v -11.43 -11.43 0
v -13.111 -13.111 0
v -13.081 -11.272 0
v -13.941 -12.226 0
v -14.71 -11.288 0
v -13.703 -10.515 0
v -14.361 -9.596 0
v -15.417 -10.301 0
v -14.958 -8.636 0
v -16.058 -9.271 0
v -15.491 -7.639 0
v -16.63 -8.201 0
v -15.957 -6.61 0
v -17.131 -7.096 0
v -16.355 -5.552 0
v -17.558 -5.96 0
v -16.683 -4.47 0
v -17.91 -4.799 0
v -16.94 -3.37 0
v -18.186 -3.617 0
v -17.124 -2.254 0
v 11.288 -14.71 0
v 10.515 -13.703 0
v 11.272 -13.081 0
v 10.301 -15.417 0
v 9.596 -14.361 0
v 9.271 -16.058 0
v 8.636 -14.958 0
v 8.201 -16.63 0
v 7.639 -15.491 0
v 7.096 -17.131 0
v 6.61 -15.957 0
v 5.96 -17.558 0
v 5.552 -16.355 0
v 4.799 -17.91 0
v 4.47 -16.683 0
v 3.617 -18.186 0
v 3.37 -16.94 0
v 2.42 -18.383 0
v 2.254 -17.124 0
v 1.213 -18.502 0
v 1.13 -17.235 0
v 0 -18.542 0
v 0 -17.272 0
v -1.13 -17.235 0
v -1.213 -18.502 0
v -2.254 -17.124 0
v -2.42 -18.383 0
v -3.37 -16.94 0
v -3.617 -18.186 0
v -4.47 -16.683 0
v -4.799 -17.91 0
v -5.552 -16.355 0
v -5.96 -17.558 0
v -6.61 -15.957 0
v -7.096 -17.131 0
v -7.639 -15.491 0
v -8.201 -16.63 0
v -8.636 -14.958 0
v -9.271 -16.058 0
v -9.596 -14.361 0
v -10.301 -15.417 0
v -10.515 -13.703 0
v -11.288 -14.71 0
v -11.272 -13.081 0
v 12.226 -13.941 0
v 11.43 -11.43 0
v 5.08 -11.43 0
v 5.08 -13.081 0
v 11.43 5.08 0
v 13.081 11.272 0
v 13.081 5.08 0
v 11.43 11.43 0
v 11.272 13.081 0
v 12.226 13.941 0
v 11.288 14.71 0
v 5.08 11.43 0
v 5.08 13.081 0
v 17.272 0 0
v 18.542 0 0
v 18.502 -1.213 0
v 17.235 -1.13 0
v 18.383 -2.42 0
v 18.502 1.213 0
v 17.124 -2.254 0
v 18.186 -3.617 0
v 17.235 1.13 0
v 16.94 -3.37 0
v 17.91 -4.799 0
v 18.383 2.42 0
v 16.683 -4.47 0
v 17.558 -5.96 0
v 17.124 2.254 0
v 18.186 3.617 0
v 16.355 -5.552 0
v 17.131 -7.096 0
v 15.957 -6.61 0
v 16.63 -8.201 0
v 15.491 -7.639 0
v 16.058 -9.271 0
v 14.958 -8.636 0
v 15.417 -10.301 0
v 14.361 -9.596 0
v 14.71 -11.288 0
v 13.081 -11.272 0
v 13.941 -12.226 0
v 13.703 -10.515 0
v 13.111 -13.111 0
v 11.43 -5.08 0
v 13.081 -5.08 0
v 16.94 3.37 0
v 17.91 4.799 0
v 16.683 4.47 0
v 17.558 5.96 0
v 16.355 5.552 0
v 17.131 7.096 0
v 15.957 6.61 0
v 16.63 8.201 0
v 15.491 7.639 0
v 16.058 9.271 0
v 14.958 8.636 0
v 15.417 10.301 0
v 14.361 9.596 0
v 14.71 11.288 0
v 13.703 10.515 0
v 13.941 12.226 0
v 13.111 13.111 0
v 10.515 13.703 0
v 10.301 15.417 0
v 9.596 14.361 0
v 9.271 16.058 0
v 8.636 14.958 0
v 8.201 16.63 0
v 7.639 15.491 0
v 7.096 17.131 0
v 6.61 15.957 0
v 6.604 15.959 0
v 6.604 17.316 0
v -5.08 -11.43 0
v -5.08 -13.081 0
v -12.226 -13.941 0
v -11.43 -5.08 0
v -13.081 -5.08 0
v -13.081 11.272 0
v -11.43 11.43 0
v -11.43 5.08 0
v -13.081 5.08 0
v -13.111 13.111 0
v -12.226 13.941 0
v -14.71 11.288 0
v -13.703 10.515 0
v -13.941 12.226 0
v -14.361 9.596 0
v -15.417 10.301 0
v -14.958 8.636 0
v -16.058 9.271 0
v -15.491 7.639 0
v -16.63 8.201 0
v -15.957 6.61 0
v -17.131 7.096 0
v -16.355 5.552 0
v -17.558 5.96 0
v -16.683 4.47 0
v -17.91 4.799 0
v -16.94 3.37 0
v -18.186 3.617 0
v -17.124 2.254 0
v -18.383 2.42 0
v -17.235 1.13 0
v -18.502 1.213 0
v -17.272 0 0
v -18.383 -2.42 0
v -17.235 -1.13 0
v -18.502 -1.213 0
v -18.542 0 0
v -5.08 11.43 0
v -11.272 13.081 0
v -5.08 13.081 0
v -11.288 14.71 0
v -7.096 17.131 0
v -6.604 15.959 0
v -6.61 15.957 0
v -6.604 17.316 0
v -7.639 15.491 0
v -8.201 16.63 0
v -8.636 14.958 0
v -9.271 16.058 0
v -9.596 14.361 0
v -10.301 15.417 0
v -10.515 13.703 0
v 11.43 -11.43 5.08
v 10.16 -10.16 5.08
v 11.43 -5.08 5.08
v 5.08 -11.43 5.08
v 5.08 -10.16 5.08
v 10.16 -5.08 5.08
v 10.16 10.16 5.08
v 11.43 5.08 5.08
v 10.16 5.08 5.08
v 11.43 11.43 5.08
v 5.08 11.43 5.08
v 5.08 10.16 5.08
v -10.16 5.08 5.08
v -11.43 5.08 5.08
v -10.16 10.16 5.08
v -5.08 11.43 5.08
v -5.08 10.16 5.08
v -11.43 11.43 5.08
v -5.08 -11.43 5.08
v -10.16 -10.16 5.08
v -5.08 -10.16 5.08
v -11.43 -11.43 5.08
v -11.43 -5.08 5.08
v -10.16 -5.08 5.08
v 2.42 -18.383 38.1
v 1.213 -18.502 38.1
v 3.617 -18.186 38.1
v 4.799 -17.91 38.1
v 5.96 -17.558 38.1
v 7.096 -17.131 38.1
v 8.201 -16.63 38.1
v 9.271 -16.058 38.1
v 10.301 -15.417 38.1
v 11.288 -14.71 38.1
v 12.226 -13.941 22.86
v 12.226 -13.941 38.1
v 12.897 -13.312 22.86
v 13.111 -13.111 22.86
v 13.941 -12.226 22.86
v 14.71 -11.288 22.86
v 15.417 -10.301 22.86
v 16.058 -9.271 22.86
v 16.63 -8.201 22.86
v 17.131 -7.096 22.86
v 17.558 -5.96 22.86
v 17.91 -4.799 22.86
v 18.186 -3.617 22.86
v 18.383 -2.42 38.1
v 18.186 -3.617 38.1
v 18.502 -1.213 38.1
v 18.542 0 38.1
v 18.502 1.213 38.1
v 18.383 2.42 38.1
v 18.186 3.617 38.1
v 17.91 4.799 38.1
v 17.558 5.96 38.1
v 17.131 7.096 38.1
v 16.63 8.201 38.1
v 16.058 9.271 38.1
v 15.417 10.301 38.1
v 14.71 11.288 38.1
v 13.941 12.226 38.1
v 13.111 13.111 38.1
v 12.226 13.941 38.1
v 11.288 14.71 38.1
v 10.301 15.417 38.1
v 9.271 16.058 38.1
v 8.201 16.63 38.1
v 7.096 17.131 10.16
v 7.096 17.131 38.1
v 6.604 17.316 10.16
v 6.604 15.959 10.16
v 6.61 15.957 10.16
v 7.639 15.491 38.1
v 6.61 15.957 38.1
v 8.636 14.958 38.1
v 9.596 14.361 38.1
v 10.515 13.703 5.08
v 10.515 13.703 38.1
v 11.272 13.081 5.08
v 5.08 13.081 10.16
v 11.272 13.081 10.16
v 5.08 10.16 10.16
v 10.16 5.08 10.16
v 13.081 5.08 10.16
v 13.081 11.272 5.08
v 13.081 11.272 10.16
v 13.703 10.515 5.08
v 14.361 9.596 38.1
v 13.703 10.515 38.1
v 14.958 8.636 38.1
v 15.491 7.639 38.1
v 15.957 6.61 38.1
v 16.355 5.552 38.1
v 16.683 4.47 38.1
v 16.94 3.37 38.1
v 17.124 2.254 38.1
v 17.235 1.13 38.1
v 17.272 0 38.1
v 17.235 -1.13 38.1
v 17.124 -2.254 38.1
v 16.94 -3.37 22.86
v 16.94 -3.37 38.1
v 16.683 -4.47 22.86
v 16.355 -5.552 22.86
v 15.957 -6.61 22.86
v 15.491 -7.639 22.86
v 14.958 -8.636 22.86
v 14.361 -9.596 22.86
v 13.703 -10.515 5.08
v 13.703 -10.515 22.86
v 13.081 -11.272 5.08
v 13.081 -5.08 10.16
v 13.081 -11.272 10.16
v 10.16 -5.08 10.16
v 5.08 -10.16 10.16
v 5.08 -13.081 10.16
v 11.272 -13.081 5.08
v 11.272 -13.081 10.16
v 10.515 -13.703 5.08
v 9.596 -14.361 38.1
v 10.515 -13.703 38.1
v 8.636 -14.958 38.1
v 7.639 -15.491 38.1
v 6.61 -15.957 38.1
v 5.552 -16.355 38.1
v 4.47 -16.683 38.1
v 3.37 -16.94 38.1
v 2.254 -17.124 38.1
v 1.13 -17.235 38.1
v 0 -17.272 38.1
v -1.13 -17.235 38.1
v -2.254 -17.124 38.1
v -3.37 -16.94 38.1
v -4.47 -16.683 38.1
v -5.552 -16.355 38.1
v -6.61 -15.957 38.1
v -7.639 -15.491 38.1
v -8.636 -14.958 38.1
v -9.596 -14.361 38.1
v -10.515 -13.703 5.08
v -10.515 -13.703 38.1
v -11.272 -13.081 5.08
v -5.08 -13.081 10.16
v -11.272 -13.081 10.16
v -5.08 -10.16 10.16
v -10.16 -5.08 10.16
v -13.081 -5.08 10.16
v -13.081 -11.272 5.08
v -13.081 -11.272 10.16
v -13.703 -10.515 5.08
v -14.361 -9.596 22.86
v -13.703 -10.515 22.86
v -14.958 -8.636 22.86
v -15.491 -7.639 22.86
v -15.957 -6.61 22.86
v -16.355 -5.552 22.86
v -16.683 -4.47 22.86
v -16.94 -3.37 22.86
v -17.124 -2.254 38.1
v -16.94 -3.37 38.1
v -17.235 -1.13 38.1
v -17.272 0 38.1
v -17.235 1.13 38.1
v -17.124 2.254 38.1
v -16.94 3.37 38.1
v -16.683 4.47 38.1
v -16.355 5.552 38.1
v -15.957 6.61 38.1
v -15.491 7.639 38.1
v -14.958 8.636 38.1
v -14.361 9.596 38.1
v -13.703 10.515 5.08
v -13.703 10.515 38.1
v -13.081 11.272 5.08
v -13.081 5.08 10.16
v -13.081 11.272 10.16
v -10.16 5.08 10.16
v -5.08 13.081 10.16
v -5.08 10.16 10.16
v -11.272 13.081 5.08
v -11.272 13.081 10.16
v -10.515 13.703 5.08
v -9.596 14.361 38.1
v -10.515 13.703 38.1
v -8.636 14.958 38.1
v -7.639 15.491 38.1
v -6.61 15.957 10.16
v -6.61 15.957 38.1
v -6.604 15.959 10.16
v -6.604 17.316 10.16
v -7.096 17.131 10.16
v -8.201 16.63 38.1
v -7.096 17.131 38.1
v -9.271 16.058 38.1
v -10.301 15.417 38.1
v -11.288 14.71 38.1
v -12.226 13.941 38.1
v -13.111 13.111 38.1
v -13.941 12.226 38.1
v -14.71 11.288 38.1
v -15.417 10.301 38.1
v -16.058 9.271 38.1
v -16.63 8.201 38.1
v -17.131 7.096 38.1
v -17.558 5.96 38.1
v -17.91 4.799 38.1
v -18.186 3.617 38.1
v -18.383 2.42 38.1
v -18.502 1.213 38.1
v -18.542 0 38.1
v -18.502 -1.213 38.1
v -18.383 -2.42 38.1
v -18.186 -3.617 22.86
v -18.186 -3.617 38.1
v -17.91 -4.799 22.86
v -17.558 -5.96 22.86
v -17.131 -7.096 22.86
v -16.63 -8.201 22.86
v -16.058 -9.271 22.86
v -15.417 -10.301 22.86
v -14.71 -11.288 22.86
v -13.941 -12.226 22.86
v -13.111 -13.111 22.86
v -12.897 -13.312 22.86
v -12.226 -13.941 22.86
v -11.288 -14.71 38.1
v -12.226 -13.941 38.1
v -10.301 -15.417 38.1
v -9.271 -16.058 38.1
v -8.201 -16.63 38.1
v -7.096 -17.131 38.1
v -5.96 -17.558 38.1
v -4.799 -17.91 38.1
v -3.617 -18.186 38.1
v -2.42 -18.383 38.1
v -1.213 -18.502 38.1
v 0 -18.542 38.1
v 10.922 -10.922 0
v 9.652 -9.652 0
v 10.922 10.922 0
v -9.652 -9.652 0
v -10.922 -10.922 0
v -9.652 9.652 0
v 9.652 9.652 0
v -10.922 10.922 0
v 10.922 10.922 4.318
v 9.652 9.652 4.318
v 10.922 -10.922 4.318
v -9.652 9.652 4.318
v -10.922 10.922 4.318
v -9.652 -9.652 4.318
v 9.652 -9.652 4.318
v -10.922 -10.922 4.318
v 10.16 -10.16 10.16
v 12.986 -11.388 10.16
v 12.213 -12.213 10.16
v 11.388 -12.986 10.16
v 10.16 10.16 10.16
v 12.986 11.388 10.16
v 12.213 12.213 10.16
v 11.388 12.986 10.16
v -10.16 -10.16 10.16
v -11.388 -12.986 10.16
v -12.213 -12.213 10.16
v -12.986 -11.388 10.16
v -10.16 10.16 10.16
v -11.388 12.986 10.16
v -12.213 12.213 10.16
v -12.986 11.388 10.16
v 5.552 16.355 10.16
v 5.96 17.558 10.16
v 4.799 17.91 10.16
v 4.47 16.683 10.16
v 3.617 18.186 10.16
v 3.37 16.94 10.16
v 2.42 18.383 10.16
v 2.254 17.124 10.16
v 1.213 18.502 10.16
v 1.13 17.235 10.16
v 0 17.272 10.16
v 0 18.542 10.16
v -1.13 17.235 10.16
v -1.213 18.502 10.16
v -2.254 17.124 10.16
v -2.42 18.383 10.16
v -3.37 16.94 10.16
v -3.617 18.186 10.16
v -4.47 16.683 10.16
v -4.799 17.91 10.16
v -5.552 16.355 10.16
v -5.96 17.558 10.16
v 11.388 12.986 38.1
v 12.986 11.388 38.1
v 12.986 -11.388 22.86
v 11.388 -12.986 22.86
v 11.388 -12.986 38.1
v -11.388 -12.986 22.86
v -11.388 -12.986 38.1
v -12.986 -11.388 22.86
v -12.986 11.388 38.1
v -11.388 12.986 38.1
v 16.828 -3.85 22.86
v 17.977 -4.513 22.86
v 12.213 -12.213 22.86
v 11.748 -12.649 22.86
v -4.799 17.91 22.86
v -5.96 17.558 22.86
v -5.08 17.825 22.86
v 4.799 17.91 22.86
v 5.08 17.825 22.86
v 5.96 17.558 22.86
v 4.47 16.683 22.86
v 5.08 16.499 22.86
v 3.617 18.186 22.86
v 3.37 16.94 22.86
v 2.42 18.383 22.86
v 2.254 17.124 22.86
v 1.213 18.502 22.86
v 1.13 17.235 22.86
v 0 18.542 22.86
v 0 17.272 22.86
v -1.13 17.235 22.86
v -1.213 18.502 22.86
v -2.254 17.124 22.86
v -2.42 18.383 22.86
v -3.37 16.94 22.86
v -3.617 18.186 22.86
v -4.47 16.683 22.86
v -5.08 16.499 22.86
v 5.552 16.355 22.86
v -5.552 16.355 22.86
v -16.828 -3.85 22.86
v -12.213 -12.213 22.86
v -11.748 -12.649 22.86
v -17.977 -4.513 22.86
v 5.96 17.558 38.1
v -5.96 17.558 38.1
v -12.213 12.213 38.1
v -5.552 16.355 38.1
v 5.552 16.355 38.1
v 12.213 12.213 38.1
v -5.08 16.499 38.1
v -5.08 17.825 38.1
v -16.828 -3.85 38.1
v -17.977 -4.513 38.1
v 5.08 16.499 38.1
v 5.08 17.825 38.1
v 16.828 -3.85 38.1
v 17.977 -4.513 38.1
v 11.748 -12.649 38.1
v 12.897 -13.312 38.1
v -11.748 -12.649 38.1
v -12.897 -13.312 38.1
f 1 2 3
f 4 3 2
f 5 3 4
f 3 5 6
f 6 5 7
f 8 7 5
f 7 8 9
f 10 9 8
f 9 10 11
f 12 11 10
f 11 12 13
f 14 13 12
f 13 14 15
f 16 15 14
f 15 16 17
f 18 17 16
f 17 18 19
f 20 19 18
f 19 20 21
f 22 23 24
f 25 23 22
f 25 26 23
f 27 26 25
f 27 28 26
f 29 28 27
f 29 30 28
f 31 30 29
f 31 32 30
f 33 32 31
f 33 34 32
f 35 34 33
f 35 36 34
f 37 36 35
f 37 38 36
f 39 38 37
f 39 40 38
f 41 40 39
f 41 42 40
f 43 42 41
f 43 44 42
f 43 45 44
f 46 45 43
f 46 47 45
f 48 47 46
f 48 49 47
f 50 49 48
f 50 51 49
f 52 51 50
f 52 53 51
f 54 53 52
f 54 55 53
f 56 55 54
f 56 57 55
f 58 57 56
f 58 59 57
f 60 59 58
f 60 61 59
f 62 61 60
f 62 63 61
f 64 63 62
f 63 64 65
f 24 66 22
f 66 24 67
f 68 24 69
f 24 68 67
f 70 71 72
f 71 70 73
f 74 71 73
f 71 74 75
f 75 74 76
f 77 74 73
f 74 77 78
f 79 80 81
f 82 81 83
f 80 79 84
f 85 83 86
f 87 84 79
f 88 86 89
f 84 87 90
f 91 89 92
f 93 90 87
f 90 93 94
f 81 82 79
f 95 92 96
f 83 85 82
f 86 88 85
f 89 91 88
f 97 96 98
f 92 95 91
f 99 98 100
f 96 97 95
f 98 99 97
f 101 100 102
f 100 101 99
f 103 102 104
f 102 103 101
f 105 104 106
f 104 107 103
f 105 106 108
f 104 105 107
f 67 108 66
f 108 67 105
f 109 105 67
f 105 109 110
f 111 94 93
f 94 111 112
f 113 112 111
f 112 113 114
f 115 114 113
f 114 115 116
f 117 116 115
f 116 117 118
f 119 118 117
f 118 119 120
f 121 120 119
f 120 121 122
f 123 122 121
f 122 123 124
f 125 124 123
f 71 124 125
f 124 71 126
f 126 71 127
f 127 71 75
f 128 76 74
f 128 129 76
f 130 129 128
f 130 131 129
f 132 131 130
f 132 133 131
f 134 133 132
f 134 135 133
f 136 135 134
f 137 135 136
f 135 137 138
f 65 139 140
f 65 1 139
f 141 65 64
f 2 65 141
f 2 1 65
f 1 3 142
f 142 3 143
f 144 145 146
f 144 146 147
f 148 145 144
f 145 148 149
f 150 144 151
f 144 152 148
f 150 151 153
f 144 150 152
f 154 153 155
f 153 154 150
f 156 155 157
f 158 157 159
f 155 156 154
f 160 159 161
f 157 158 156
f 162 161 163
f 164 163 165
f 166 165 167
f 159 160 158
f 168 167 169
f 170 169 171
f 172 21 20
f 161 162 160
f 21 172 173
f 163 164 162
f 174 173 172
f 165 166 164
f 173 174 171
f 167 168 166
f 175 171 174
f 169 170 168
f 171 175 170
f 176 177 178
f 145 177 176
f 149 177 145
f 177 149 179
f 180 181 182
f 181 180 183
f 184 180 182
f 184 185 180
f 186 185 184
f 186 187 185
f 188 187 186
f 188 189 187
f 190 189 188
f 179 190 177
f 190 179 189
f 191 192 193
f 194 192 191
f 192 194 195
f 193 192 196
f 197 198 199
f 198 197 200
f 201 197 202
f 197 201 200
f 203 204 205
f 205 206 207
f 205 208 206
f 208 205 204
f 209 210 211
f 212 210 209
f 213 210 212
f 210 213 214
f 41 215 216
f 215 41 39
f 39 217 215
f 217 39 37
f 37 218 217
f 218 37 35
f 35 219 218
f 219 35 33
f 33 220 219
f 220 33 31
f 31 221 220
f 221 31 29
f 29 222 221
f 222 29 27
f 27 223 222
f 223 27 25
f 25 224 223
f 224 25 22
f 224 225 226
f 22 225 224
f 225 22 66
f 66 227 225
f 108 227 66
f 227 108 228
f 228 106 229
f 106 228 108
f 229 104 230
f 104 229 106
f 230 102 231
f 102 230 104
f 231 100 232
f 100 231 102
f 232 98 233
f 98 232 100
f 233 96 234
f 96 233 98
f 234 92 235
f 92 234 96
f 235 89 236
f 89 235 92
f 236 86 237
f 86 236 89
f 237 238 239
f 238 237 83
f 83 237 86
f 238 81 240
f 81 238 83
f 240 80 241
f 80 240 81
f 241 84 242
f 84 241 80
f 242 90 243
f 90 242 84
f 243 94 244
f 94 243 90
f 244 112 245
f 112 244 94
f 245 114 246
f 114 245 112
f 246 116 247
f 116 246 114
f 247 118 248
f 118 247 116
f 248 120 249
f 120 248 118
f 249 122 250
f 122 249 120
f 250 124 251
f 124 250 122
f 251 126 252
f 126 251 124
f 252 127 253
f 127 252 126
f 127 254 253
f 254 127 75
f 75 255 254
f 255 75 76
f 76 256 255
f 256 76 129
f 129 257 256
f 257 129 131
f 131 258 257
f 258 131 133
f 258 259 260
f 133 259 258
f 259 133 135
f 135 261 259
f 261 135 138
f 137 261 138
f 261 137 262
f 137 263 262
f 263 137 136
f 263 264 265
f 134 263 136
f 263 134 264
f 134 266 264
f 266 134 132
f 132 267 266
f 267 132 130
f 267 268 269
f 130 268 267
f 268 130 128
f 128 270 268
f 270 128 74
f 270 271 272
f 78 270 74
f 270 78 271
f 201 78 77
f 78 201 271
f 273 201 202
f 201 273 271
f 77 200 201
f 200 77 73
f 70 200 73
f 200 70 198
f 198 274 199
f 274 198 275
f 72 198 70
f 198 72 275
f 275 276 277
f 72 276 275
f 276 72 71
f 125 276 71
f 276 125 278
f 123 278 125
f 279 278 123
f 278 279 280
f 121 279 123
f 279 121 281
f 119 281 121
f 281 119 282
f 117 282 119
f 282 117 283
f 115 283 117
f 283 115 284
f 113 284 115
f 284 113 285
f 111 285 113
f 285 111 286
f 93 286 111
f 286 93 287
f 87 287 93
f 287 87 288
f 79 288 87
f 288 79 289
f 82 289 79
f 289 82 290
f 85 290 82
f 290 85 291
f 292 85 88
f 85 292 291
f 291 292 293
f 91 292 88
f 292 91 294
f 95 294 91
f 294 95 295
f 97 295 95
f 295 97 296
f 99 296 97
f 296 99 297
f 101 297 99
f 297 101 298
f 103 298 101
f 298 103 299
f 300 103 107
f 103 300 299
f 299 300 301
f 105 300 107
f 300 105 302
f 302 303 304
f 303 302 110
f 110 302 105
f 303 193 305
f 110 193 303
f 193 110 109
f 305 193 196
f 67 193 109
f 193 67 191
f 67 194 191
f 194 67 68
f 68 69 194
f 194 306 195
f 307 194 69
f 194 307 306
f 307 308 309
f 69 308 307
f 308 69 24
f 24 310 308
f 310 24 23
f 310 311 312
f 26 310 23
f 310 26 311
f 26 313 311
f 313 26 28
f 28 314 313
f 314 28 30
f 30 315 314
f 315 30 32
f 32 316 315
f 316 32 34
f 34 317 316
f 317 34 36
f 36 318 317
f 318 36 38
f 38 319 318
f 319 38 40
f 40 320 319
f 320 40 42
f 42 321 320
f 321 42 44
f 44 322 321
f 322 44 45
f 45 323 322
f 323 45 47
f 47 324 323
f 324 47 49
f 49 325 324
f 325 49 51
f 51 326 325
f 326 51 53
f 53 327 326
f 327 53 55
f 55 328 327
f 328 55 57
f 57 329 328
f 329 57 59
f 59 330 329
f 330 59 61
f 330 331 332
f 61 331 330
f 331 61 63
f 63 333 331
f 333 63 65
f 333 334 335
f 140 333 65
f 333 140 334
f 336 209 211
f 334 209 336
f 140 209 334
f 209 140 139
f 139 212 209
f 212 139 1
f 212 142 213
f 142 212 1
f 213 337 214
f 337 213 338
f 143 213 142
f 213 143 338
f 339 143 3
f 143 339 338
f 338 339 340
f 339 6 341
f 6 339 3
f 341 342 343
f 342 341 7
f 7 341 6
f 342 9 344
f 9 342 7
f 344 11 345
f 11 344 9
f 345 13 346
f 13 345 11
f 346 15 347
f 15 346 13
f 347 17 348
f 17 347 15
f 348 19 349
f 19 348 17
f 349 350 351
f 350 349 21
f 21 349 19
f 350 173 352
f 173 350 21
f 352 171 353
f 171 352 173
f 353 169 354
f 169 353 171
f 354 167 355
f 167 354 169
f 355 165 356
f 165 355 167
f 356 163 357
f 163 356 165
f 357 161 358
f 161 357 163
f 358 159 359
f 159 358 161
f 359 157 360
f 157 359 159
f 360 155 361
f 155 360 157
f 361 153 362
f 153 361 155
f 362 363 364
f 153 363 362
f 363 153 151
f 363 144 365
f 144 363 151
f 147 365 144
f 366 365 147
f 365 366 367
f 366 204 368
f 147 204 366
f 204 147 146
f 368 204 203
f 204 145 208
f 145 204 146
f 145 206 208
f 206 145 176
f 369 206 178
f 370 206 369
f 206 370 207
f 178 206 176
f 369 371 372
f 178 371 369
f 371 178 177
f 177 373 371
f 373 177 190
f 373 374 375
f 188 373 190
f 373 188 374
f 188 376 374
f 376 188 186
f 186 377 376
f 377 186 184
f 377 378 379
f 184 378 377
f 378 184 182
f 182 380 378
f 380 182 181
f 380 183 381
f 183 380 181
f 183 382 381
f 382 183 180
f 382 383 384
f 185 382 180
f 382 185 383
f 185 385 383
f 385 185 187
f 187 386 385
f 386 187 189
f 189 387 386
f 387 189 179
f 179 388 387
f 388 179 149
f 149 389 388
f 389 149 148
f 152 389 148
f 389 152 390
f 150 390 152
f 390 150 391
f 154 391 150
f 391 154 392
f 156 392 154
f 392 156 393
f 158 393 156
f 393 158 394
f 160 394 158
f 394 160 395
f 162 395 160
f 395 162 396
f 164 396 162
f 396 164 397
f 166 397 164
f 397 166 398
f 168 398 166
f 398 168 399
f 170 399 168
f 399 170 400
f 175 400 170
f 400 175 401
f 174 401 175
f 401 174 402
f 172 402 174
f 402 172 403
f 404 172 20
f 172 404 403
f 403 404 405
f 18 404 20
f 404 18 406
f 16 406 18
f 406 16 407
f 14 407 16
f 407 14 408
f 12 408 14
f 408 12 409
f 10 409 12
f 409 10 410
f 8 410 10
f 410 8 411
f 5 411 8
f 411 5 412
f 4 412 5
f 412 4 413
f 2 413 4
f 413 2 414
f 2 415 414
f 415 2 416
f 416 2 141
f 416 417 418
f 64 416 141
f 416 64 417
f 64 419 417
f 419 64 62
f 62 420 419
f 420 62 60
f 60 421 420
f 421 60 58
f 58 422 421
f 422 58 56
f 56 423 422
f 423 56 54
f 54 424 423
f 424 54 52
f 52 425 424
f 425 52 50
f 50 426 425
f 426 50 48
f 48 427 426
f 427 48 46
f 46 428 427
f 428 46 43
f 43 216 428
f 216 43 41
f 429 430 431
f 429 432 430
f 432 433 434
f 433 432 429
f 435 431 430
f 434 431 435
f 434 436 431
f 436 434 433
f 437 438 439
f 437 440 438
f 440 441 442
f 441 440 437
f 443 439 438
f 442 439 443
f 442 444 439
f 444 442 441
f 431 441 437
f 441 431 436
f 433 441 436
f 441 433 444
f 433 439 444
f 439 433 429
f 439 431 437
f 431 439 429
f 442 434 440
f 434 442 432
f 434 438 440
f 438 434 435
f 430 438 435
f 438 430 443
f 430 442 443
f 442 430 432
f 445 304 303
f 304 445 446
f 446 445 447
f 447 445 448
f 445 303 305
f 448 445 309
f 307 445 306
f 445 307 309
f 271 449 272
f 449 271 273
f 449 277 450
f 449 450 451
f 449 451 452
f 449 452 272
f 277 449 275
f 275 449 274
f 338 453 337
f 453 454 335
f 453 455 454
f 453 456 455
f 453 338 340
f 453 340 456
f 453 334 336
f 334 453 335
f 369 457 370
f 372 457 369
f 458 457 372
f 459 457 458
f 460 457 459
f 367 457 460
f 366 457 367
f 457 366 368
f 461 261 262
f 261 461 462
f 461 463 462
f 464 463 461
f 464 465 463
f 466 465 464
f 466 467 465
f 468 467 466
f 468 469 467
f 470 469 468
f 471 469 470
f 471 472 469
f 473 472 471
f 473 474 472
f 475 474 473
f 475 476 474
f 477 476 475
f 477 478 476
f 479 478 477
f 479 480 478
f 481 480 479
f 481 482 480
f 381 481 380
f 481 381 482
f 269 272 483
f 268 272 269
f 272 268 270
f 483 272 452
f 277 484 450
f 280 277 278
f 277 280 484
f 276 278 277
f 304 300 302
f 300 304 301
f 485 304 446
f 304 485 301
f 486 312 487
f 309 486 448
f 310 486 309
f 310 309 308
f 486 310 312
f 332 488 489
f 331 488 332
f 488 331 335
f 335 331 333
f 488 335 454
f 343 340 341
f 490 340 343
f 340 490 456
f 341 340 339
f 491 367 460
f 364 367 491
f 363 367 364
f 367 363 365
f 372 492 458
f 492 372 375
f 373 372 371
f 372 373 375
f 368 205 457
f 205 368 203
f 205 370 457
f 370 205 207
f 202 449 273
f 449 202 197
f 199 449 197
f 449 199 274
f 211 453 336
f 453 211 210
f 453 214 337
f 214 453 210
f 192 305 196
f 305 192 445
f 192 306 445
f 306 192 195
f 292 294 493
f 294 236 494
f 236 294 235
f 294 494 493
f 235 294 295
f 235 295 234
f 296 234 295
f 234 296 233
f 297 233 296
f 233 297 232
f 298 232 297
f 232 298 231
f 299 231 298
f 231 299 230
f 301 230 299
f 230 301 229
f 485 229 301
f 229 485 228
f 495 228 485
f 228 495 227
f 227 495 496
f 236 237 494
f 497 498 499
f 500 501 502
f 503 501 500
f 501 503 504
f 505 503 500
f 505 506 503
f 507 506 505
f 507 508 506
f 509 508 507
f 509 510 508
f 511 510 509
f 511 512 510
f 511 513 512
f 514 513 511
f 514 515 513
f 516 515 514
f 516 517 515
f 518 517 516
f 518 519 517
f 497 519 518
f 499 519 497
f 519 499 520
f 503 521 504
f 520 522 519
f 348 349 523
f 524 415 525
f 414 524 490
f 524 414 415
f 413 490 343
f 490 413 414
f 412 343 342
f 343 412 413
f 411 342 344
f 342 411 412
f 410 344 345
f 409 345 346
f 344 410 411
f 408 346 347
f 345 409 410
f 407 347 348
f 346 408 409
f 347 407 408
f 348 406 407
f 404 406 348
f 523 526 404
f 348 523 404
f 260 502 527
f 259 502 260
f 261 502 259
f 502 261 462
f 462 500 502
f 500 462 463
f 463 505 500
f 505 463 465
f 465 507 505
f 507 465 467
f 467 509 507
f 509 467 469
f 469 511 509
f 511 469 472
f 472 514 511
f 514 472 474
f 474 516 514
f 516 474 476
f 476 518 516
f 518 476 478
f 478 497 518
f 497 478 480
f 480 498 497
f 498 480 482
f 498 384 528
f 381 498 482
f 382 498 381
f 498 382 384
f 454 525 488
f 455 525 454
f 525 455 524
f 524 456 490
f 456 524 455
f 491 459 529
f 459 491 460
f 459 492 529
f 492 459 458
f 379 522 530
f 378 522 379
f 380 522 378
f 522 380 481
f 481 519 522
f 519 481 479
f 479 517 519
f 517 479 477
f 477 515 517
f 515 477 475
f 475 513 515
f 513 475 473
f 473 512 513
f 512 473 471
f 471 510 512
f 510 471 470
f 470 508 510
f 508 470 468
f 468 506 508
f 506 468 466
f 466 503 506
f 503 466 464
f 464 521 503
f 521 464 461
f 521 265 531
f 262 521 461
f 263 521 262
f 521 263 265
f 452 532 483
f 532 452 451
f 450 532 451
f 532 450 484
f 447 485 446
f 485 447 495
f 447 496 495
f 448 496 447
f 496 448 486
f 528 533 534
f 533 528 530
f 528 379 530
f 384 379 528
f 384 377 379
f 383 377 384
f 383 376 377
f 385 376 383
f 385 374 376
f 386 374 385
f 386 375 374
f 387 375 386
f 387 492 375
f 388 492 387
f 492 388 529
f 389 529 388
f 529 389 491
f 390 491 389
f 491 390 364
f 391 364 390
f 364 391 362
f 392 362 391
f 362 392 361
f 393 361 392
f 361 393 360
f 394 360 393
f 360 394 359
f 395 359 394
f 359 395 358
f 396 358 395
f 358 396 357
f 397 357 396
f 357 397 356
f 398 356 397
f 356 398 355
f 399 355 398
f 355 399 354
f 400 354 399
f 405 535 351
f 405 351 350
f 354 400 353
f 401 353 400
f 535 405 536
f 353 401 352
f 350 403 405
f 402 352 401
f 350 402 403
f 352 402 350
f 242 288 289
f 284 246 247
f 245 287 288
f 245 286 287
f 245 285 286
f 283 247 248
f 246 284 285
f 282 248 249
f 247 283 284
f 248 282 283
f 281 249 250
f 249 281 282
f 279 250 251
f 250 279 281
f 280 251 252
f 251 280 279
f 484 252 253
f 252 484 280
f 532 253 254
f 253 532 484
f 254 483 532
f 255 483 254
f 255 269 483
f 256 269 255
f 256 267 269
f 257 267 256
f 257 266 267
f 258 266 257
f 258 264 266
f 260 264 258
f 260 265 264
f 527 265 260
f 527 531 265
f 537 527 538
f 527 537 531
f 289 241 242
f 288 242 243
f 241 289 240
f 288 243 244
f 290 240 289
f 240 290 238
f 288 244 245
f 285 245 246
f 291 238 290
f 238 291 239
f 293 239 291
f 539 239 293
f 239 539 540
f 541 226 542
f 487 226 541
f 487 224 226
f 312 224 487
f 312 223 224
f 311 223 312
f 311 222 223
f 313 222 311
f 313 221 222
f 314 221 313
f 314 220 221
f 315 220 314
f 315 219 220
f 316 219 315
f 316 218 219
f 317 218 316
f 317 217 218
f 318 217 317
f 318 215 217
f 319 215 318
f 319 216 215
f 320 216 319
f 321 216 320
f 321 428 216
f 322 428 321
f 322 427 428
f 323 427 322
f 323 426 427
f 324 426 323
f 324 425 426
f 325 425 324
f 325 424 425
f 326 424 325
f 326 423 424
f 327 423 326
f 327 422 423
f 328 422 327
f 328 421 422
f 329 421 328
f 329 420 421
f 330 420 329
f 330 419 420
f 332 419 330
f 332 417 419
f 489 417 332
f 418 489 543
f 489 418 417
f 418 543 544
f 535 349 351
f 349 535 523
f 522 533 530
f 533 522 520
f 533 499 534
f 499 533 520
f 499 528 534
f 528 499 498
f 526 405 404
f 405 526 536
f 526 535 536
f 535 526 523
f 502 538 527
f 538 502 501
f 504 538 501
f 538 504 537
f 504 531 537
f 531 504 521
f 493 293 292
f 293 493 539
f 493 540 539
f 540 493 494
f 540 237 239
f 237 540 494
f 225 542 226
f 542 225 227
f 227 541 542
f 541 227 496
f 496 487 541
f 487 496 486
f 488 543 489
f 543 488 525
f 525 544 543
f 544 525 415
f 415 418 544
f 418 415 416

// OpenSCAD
ViewScale = [0.0254, 0.0254, 0.0254];

module cutouts()
{
    difference() {
        circle(1460/2, $fn=96);
        circle(1360/2, $fn=96);
        // tab
        translate([0, 700, 0])
        square([400, 200], center=true);
        // tab
        rotate([0, 0, 120]) 
        translate([0, 700, 0])
        square([400, 200], center=true);
        // tab
        rotate([0, 0, 240]) 
        translate([0, 700, 0])
        square([400, 200], center=true);
    }
}

module rotcutouts() {
    for(ii=[0:90:360]) {
        rotate([0, 0, ii])
        translate([0, 500, 0])
        square([400, 200], center=true);
    }
}

module bodymain()
{
    difference() {
        circle(1460/2, $fn=96);
        circle(1360/2, $fn=96);
    }
}

module bodycutout()
{
    difference() {
        circle(1460/2, $fn=96);
        circle(1360/2, $fn=96);
        *square([1020, 1020], center=true);
        translate([0, 700, 0])
        square([400, 200], center=true);
        scale([1.3,1.3,1.3])
        translate([0, 500, 0])
        square([400, 200], center=true);
        //rotcutouts();
    }
}

module bodycutout2()
{
    difference() {
        circle(1460/2, $fn=96);
        circle(1360/2, $fn=96);
        scale([1.3,1.3,1.3])
        translate([0, 500, 0])
        square([400, 200], center=true);
        //rotcutouts();
    }
}

module ledframe2()
{
    difference() {
    square([1030, 1030], center=true);
    square([800, 800], center=true);
    rotcutouts();
//    translate([0, 500, 0])
//    square([400, 200], center=true);
    }
}

module ledframe1()
{
    difference() {
        square([1030, 1030], center=true);
        square([900, 900], center=true);
        rotcutouts();
    }
}

module support()
{
    difference() {
    square([860, 860], center=true);
    square([760, 760], center=true);
    }
}

scale(ViewScale)
{
    linear_extrude(200){
        ledframe1();
        bodycutout();
    }
    linear_extrude(170)
    support();

    translate([0, 0, 200])
    linear_extrude(200)
    bodycutout2();

    translate([0, 0, 200])
    linear_extrude(200)
    ledframe2();

    translate([0, 0, 400])
    linear_extrude(500)
    bodymain();
    translate([0, 0, 900])
    linear_extrude(600)
    cutouts();
}
